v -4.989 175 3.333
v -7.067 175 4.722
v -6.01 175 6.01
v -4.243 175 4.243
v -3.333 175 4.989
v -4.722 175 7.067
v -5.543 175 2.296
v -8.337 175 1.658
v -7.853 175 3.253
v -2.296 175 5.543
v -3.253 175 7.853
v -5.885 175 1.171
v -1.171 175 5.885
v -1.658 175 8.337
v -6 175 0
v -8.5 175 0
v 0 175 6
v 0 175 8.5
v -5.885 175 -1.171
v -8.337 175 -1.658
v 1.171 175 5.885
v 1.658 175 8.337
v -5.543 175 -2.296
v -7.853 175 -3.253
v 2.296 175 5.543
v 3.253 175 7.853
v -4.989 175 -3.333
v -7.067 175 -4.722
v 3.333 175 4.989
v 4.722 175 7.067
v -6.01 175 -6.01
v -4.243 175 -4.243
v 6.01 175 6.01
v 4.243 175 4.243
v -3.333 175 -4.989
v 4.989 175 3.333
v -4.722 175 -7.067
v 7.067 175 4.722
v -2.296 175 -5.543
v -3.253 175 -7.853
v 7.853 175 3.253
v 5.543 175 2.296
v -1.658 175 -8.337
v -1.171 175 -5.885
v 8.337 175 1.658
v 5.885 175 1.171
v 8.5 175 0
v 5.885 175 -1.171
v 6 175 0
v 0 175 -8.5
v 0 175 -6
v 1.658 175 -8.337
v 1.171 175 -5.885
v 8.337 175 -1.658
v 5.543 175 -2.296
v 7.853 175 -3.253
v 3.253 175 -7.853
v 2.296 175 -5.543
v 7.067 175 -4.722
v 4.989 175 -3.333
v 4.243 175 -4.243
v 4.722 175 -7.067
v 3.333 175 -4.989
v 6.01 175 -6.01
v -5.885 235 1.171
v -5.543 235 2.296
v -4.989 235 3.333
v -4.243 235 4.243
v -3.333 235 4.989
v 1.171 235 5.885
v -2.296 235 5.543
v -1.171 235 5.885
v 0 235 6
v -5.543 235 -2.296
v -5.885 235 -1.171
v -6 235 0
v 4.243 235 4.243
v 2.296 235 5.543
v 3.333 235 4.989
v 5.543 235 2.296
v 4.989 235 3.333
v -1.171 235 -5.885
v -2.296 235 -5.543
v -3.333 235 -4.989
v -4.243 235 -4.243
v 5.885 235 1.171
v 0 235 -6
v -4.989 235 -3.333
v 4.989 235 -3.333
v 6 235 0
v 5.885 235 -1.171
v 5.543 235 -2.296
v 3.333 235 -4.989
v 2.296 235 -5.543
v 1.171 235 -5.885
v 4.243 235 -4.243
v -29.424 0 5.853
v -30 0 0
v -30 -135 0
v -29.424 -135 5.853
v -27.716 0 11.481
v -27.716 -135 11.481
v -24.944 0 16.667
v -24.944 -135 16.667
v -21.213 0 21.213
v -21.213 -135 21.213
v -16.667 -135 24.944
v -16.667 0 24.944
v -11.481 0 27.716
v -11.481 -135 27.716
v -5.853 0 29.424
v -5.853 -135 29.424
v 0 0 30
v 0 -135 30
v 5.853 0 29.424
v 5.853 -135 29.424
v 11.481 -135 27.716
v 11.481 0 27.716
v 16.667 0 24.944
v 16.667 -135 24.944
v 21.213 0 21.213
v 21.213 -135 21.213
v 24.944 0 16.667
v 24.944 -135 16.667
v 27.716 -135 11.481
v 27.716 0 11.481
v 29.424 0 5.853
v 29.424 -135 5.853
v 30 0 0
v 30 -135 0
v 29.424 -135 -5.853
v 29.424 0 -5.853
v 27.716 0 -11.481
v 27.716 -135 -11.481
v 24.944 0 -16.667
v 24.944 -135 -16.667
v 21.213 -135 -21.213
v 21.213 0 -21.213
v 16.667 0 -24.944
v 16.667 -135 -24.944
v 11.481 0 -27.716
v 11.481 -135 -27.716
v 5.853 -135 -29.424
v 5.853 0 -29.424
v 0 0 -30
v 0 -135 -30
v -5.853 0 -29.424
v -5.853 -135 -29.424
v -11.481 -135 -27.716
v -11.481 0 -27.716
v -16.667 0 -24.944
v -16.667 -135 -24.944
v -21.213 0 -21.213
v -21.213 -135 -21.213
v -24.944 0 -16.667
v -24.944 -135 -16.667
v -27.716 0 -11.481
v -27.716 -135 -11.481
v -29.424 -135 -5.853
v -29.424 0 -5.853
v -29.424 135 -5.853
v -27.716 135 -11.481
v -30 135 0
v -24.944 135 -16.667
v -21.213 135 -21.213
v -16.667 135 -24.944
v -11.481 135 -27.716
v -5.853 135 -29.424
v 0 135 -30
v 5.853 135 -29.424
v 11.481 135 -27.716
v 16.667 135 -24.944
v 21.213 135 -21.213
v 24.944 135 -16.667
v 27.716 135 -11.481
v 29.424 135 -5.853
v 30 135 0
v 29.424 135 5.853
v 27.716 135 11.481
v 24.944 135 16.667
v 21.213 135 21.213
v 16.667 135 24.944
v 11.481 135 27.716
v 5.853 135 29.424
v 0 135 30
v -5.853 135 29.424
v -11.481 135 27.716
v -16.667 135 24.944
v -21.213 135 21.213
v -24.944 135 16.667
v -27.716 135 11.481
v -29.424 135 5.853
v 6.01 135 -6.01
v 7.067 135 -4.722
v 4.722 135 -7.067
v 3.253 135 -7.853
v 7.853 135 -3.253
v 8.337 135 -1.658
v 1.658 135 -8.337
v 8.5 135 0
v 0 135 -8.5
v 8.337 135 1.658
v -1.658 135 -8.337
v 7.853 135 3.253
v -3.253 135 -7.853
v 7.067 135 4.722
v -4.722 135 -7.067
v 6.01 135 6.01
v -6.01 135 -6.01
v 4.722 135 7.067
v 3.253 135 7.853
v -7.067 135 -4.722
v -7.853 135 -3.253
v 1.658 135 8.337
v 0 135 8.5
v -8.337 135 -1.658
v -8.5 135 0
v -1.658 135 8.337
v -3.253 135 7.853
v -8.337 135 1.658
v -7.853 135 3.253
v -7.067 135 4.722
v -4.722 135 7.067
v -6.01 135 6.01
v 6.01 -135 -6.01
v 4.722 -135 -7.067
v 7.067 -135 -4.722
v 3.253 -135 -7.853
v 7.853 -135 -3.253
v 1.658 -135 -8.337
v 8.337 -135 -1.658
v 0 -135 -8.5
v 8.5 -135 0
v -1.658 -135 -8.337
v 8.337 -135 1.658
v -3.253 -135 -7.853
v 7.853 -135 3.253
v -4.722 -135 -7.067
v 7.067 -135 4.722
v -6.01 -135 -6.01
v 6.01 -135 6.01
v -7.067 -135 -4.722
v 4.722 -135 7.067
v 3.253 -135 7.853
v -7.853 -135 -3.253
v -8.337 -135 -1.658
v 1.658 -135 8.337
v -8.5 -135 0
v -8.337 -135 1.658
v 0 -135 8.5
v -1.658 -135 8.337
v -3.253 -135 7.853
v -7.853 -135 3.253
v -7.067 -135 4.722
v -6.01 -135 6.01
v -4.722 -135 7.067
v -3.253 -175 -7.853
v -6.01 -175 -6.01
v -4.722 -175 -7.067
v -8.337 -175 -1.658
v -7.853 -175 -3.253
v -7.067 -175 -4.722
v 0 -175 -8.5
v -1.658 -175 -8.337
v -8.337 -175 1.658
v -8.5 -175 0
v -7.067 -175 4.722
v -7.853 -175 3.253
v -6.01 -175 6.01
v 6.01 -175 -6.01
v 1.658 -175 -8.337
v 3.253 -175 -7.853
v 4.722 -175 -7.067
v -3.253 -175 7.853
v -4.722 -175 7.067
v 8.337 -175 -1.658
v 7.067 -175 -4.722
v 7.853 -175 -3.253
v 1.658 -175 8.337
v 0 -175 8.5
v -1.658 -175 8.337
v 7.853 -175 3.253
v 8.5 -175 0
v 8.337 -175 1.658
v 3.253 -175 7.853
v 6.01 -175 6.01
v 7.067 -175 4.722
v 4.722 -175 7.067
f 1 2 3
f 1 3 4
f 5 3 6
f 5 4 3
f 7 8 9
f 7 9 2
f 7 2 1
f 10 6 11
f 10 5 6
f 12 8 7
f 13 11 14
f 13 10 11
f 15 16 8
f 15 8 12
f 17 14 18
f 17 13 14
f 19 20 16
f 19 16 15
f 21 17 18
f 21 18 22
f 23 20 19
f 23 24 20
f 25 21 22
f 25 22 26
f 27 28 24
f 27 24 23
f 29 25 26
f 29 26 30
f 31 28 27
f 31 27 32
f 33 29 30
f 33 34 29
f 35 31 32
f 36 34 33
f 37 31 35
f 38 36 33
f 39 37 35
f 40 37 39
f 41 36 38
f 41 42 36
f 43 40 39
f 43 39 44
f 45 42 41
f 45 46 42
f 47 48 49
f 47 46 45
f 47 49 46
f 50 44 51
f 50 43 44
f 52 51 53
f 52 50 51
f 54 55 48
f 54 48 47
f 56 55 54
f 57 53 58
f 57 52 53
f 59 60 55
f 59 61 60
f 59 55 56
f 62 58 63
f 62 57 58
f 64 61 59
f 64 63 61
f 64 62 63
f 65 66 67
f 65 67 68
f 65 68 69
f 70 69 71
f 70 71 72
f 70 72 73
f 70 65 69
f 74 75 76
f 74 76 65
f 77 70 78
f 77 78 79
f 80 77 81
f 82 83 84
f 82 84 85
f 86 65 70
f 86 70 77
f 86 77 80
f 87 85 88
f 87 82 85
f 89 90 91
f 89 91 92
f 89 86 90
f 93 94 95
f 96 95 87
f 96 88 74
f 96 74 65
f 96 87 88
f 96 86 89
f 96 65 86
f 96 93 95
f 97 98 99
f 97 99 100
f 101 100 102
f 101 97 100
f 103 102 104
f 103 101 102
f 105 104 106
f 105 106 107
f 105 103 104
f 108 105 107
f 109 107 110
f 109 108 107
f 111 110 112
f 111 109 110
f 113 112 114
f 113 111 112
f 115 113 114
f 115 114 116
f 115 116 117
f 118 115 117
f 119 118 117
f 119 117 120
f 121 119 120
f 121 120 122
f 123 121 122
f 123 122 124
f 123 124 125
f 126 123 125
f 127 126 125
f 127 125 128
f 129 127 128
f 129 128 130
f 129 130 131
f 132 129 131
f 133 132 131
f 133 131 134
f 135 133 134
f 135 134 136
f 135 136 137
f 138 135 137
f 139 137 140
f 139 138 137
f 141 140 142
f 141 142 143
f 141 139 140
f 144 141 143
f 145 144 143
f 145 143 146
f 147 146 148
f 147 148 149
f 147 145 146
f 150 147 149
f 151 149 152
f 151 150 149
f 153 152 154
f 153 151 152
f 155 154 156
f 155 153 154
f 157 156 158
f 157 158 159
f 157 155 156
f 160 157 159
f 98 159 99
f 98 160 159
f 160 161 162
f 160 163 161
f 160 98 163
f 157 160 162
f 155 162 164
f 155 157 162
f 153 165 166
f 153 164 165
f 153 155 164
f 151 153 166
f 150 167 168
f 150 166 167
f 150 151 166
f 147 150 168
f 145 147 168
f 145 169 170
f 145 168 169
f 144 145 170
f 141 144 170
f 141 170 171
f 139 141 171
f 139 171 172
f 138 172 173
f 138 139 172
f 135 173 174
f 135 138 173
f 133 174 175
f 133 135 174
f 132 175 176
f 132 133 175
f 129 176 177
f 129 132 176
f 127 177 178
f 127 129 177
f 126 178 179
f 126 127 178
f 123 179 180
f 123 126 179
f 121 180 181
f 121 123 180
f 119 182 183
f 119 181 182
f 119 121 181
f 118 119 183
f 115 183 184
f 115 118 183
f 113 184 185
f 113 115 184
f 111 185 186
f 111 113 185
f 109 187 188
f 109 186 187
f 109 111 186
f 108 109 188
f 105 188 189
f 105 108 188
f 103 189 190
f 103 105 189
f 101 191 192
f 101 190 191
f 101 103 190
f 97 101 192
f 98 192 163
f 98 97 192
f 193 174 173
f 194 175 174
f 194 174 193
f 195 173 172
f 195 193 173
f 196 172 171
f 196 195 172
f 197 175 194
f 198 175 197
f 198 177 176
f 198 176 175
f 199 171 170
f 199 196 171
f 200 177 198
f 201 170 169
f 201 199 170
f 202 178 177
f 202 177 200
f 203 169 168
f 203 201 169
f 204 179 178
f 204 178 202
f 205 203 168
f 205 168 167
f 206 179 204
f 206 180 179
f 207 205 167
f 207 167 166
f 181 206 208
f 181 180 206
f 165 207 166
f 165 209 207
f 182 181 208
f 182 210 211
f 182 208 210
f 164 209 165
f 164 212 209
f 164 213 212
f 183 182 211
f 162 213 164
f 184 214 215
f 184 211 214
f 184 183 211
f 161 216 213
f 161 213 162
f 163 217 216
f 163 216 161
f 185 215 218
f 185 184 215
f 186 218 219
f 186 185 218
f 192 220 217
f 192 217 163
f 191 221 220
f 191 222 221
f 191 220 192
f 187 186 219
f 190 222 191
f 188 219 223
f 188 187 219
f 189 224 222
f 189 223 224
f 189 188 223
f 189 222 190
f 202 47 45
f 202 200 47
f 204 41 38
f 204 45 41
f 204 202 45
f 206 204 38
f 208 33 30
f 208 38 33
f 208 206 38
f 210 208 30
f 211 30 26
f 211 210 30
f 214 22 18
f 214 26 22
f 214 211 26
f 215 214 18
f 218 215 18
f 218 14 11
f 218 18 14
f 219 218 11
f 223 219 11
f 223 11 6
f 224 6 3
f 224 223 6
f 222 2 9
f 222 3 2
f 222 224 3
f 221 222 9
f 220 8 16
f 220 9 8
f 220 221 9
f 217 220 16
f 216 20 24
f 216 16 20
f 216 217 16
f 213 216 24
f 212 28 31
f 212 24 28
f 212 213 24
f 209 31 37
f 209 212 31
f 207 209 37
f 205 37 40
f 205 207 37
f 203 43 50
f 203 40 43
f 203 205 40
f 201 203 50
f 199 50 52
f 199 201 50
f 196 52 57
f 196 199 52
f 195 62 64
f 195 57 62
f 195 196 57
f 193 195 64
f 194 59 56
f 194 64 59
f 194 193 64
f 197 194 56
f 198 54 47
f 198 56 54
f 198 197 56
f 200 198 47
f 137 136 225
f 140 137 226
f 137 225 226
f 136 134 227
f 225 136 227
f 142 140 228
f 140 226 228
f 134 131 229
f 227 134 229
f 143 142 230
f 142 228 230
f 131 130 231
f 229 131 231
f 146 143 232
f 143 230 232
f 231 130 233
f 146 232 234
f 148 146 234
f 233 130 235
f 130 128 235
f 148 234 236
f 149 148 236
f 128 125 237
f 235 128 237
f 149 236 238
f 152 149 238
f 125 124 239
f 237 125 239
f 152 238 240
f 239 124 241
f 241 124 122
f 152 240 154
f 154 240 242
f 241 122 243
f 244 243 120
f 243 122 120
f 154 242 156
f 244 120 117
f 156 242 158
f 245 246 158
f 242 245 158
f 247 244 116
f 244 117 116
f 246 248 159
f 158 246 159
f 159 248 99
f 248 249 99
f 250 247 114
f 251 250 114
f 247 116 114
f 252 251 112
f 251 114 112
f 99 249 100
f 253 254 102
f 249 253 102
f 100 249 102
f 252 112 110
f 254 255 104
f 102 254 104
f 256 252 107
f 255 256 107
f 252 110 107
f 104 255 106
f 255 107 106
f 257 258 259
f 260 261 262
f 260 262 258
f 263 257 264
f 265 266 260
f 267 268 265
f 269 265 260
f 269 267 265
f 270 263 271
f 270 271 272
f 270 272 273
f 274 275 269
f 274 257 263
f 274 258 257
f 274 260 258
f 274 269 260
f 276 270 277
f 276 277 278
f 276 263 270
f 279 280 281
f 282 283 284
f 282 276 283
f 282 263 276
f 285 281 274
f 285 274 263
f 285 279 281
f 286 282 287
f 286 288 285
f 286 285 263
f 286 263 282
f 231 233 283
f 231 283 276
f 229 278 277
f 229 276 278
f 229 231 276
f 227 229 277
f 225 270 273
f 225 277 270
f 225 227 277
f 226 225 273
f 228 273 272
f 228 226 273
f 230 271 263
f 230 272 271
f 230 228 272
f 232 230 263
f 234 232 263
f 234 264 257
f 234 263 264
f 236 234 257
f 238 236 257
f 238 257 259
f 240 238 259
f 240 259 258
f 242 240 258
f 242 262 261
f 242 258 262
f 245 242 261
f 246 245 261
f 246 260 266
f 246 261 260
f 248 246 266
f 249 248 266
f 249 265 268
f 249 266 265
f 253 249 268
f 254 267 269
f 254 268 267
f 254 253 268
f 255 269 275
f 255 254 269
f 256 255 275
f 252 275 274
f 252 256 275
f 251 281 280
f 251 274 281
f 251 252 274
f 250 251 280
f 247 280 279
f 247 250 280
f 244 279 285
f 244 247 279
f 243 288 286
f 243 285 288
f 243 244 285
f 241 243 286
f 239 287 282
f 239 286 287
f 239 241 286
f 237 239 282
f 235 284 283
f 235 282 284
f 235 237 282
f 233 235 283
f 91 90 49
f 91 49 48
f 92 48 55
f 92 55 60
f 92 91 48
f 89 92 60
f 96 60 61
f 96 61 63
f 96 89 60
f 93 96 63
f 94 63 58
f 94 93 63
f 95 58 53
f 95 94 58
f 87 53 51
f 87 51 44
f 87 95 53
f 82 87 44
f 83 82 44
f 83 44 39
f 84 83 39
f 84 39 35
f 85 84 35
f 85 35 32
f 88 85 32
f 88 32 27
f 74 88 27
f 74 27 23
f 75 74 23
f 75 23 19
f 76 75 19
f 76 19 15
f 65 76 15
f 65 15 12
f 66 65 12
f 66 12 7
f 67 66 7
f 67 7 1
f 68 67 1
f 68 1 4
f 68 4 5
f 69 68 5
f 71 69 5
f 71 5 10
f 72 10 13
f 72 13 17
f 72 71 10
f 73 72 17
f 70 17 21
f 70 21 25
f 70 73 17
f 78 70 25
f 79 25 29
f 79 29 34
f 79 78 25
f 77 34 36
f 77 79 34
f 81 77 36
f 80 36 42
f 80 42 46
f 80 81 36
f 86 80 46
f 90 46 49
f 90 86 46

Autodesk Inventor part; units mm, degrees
ref_plane "YZ Plane" through (0, 0, 0) normal (1, 0, 0) x (0, 1, 0)
ref_plane "XZ Plane" through (0, 0, 0) normal (0, 1, 0) x (-1, 0, 0)
ref_plane "XY Plane" through (0, 0, 0) normal (0, 0, 1) x (1, 0, 0)
sketch "Sketch1" plane through (0, 0, 0) normal (0, 1, 0) x (-1, 0, 0)
  circle A0 centre (0, 0) radius 30
  dimension "d0" = 60
extrude "Extrusion1" add sketch "Sketch1" along normal mid plane 270
sketch "Sketch2" plane through (0, -135, 0) normal (0, -1, 0) x (1, 0, 0)
  circle A0 centre (0, 0) radius 8.5
  dimension "d3" = 17
extrude "Extrusion2" add sketch "Sketch2" along normal blind 40
sketch "Sketch3" plane through (0, 135, 0) normal (0, 1, 0) x (1, 0, 0)
  circle A0 centre (0, 0) radius 8.5 projected
  circle A1 centre (0, 0) radius 8.5
  dimension "d6" = 17
extrude "Extrusion3" add sketch "Sketch3" along normal blind 100
sketch "Sketch4" plane through (0, 235, 0) normal (0, 1, 0) x (1, 0, 0)
  circle A0 centre (0, 0) radius 8.5 projected
  circle A1 centre (0, 0) radius 6
  dimension "d9" = 12
extrude "Extrusion4" cut sketch "Sketch4" against normal blind 60
properties part number "HCMUTE-CDT23-TRUC_DAN" material "Stainless Steel"
